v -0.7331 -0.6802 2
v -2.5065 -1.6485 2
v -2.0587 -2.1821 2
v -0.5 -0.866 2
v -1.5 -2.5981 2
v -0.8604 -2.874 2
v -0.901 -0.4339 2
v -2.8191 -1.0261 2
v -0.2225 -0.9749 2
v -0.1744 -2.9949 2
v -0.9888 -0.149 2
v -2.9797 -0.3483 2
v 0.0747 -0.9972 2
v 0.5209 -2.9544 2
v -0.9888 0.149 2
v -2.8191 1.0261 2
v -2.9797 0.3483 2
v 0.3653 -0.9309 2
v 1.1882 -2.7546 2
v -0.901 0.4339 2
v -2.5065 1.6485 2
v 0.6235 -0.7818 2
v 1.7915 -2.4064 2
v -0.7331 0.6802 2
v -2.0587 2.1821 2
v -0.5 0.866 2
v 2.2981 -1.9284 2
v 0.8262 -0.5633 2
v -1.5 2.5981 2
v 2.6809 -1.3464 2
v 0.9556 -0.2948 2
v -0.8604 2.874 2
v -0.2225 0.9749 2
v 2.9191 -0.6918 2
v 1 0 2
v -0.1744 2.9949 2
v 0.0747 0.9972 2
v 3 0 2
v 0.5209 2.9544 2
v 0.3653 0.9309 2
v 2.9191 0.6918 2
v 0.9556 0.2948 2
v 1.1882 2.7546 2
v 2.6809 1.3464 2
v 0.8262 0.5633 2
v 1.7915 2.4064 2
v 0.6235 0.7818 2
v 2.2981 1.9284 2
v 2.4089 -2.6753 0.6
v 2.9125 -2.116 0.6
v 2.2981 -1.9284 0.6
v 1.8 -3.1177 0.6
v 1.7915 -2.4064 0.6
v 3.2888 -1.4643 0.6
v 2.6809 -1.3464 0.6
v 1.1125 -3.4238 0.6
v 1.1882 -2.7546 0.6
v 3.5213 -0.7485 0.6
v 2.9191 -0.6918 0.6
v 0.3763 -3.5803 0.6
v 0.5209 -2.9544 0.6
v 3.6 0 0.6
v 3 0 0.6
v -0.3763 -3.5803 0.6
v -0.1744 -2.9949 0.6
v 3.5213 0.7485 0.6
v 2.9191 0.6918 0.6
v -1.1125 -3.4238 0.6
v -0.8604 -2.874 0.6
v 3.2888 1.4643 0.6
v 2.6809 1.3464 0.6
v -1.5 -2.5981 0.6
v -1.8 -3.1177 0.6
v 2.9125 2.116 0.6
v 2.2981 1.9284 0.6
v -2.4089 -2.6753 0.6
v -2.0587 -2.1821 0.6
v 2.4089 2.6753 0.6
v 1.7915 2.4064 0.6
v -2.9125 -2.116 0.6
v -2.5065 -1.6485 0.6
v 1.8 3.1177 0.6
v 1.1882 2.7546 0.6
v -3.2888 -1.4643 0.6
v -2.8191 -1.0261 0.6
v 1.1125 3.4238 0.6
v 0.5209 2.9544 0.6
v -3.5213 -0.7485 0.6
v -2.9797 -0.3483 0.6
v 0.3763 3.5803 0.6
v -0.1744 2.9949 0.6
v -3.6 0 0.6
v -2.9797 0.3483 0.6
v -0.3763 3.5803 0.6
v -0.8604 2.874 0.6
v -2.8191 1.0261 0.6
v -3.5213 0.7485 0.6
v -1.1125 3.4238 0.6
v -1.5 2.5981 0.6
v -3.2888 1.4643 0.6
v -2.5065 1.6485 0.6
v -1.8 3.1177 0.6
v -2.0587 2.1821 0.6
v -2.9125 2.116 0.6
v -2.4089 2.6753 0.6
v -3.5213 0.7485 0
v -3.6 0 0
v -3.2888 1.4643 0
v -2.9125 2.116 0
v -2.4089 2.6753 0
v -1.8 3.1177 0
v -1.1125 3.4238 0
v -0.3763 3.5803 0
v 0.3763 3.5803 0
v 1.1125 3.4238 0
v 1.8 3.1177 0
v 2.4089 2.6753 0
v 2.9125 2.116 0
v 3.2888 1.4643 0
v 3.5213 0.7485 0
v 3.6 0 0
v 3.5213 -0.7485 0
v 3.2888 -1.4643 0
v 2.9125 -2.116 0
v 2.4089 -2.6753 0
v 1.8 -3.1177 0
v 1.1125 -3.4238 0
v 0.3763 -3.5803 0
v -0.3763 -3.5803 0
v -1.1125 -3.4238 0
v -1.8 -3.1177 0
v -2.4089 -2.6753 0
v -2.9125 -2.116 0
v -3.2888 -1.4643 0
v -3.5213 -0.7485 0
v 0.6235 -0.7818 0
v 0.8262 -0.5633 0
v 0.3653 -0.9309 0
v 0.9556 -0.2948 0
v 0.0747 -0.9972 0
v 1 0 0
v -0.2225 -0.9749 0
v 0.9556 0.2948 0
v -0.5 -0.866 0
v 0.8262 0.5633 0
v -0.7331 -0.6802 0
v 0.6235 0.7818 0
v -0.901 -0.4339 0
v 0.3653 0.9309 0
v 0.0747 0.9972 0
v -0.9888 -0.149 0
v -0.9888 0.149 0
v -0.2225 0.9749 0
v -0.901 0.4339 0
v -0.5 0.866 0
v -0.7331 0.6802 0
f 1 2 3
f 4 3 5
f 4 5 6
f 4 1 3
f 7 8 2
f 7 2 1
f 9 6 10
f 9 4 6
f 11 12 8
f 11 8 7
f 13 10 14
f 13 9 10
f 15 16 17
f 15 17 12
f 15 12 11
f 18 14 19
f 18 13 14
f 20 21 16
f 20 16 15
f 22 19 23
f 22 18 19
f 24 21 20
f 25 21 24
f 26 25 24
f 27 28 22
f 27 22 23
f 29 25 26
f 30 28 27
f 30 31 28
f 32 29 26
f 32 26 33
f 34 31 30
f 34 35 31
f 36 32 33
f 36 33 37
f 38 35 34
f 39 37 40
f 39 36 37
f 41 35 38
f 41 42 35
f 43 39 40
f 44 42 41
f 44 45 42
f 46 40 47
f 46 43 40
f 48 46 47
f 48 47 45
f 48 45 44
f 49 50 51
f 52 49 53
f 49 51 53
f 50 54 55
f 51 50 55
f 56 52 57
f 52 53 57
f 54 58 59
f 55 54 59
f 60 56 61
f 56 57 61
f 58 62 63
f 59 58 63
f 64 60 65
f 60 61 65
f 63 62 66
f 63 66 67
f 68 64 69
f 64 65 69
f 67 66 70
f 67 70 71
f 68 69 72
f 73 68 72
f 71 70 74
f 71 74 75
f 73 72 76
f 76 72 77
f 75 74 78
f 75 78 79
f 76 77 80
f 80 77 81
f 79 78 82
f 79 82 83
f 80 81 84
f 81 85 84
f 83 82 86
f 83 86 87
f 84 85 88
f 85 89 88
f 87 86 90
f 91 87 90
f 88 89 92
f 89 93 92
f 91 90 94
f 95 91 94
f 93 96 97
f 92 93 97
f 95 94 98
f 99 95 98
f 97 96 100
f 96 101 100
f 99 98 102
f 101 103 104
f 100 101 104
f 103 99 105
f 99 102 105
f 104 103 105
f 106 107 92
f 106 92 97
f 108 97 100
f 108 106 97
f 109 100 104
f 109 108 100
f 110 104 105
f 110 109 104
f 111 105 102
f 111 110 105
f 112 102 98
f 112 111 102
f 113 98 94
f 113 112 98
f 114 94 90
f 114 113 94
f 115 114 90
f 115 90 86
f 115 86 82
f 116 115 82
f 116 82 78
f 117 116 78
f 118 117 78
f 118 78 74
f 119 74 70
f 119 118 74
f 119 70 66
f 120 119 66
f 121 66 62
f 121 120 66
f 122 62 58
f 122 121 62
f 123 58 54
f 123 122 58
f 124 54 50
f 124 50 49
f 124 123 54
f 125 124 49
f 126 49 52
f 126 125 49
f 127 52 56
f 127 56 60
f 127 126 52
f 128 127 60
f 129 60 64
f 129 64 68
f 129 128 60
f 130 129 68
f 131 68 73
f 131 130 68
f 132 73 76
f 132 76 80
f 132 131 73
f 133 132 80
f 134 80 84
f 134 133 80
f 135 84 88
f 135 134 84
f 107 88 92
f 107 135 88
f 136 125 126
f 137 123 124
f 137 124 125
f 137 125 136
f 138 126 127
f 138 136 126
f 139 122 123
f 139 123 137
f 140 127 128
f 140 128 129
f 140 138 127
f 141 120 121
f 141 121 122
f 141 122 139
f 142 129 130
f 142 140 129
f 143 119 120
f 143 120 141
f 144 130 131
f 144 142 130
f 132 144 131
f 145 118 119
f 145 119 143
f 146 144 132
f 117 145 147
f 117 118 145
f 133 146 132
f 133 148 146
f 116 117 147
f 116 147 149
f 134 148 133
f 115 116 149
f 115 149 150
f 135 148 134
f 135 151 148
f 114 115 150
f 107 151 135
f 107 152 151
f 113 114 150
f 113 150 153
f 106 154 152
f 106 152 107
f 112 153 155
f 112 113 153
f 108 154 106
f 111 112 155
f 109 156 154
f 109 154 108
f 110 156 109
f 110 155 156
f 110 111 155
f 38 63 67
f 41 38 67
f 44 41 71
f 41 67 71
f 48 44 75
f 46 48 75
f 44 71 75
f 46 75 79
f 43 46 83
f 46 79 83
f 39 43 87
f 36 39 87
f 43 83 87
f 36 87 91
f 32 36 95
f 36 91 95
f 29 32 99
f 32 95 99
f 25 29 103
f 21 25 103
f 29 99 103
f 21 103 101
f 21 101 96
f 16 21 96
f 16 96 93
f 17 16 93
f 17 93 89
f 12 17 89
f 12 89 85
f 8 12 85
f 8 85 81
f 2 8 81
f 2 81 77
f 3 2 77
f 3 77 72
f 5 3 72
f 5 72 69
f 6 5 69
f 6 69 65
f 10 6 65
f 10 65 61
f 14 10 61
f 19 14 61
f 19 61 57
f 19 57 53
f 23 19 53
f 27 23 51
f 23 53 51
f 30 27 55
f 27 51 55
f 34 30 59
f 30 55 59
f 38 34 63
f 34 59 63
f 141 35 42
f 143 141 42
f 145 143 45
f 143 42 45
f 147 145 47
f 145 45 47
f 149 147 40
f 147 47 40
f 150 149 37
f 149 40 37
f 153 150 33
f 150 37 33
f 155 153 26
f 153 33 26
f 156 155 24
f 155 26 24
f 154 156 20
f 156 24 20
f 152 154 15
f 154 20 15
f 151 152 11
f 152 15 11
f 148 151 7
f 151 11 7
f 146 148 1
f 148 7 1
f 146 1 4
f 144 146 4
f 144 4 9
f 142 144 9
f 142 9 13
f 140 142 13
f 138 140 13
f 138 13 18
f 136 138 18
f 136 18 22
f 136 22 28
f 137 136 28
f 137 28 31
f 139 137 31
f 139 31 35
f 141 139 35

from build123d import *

# Parameters (mm, degrees)
SKETCH_1_R               = 3
EXTRUDE_1_DEPTH          = 2
SKETCH_3_R               = 3.6
EXTRUDE_2_DEPTH          = 0.6
SKETCH_4_R               = 1
CUT_EXTRUDE_1_DEPTH      = 1
CUT_EXTRUDE_1_DEPTH_BACK = 3


with BuildPart() as part:
    # Эскиз1 → Бобышка-Вытянуть1 (new body)
    with BuildSketch(Plane.XY):
        Circle(SKETCH_1_R)
    extrude(amount=EXTRUDE_1_DEPTH)

    # Эскиз3 → Бобышка-Вытянуть2 (add)
    with BuildSketch(Plane(origin=(0, 0, 0), x_dir=(-1, 0, 0), z_dir=(0, 0, -1))):
        Circle(SKETCH_3_R)
    extrude(amount=-EXTRUDE_2_DEPTH)

    # Эскиз4 → Вырез-Вытянуть1 (cut, two sides)
    with BuildSketch(Plane.XY.offset(2)) as cut_extrude_1_sk:
        Circle(SKETCH_4_R)
    extrude(amount=CUT_EXTRUDE_1_DEPTH, mode=Mode.SUBTRACT)
    extrude(cut_extrude_1_sk.sketch, amount=-CUT_EXTRUDE_1_DEPTH_BACK, mode=Mode.SUBTRACT)


solid = part.part
